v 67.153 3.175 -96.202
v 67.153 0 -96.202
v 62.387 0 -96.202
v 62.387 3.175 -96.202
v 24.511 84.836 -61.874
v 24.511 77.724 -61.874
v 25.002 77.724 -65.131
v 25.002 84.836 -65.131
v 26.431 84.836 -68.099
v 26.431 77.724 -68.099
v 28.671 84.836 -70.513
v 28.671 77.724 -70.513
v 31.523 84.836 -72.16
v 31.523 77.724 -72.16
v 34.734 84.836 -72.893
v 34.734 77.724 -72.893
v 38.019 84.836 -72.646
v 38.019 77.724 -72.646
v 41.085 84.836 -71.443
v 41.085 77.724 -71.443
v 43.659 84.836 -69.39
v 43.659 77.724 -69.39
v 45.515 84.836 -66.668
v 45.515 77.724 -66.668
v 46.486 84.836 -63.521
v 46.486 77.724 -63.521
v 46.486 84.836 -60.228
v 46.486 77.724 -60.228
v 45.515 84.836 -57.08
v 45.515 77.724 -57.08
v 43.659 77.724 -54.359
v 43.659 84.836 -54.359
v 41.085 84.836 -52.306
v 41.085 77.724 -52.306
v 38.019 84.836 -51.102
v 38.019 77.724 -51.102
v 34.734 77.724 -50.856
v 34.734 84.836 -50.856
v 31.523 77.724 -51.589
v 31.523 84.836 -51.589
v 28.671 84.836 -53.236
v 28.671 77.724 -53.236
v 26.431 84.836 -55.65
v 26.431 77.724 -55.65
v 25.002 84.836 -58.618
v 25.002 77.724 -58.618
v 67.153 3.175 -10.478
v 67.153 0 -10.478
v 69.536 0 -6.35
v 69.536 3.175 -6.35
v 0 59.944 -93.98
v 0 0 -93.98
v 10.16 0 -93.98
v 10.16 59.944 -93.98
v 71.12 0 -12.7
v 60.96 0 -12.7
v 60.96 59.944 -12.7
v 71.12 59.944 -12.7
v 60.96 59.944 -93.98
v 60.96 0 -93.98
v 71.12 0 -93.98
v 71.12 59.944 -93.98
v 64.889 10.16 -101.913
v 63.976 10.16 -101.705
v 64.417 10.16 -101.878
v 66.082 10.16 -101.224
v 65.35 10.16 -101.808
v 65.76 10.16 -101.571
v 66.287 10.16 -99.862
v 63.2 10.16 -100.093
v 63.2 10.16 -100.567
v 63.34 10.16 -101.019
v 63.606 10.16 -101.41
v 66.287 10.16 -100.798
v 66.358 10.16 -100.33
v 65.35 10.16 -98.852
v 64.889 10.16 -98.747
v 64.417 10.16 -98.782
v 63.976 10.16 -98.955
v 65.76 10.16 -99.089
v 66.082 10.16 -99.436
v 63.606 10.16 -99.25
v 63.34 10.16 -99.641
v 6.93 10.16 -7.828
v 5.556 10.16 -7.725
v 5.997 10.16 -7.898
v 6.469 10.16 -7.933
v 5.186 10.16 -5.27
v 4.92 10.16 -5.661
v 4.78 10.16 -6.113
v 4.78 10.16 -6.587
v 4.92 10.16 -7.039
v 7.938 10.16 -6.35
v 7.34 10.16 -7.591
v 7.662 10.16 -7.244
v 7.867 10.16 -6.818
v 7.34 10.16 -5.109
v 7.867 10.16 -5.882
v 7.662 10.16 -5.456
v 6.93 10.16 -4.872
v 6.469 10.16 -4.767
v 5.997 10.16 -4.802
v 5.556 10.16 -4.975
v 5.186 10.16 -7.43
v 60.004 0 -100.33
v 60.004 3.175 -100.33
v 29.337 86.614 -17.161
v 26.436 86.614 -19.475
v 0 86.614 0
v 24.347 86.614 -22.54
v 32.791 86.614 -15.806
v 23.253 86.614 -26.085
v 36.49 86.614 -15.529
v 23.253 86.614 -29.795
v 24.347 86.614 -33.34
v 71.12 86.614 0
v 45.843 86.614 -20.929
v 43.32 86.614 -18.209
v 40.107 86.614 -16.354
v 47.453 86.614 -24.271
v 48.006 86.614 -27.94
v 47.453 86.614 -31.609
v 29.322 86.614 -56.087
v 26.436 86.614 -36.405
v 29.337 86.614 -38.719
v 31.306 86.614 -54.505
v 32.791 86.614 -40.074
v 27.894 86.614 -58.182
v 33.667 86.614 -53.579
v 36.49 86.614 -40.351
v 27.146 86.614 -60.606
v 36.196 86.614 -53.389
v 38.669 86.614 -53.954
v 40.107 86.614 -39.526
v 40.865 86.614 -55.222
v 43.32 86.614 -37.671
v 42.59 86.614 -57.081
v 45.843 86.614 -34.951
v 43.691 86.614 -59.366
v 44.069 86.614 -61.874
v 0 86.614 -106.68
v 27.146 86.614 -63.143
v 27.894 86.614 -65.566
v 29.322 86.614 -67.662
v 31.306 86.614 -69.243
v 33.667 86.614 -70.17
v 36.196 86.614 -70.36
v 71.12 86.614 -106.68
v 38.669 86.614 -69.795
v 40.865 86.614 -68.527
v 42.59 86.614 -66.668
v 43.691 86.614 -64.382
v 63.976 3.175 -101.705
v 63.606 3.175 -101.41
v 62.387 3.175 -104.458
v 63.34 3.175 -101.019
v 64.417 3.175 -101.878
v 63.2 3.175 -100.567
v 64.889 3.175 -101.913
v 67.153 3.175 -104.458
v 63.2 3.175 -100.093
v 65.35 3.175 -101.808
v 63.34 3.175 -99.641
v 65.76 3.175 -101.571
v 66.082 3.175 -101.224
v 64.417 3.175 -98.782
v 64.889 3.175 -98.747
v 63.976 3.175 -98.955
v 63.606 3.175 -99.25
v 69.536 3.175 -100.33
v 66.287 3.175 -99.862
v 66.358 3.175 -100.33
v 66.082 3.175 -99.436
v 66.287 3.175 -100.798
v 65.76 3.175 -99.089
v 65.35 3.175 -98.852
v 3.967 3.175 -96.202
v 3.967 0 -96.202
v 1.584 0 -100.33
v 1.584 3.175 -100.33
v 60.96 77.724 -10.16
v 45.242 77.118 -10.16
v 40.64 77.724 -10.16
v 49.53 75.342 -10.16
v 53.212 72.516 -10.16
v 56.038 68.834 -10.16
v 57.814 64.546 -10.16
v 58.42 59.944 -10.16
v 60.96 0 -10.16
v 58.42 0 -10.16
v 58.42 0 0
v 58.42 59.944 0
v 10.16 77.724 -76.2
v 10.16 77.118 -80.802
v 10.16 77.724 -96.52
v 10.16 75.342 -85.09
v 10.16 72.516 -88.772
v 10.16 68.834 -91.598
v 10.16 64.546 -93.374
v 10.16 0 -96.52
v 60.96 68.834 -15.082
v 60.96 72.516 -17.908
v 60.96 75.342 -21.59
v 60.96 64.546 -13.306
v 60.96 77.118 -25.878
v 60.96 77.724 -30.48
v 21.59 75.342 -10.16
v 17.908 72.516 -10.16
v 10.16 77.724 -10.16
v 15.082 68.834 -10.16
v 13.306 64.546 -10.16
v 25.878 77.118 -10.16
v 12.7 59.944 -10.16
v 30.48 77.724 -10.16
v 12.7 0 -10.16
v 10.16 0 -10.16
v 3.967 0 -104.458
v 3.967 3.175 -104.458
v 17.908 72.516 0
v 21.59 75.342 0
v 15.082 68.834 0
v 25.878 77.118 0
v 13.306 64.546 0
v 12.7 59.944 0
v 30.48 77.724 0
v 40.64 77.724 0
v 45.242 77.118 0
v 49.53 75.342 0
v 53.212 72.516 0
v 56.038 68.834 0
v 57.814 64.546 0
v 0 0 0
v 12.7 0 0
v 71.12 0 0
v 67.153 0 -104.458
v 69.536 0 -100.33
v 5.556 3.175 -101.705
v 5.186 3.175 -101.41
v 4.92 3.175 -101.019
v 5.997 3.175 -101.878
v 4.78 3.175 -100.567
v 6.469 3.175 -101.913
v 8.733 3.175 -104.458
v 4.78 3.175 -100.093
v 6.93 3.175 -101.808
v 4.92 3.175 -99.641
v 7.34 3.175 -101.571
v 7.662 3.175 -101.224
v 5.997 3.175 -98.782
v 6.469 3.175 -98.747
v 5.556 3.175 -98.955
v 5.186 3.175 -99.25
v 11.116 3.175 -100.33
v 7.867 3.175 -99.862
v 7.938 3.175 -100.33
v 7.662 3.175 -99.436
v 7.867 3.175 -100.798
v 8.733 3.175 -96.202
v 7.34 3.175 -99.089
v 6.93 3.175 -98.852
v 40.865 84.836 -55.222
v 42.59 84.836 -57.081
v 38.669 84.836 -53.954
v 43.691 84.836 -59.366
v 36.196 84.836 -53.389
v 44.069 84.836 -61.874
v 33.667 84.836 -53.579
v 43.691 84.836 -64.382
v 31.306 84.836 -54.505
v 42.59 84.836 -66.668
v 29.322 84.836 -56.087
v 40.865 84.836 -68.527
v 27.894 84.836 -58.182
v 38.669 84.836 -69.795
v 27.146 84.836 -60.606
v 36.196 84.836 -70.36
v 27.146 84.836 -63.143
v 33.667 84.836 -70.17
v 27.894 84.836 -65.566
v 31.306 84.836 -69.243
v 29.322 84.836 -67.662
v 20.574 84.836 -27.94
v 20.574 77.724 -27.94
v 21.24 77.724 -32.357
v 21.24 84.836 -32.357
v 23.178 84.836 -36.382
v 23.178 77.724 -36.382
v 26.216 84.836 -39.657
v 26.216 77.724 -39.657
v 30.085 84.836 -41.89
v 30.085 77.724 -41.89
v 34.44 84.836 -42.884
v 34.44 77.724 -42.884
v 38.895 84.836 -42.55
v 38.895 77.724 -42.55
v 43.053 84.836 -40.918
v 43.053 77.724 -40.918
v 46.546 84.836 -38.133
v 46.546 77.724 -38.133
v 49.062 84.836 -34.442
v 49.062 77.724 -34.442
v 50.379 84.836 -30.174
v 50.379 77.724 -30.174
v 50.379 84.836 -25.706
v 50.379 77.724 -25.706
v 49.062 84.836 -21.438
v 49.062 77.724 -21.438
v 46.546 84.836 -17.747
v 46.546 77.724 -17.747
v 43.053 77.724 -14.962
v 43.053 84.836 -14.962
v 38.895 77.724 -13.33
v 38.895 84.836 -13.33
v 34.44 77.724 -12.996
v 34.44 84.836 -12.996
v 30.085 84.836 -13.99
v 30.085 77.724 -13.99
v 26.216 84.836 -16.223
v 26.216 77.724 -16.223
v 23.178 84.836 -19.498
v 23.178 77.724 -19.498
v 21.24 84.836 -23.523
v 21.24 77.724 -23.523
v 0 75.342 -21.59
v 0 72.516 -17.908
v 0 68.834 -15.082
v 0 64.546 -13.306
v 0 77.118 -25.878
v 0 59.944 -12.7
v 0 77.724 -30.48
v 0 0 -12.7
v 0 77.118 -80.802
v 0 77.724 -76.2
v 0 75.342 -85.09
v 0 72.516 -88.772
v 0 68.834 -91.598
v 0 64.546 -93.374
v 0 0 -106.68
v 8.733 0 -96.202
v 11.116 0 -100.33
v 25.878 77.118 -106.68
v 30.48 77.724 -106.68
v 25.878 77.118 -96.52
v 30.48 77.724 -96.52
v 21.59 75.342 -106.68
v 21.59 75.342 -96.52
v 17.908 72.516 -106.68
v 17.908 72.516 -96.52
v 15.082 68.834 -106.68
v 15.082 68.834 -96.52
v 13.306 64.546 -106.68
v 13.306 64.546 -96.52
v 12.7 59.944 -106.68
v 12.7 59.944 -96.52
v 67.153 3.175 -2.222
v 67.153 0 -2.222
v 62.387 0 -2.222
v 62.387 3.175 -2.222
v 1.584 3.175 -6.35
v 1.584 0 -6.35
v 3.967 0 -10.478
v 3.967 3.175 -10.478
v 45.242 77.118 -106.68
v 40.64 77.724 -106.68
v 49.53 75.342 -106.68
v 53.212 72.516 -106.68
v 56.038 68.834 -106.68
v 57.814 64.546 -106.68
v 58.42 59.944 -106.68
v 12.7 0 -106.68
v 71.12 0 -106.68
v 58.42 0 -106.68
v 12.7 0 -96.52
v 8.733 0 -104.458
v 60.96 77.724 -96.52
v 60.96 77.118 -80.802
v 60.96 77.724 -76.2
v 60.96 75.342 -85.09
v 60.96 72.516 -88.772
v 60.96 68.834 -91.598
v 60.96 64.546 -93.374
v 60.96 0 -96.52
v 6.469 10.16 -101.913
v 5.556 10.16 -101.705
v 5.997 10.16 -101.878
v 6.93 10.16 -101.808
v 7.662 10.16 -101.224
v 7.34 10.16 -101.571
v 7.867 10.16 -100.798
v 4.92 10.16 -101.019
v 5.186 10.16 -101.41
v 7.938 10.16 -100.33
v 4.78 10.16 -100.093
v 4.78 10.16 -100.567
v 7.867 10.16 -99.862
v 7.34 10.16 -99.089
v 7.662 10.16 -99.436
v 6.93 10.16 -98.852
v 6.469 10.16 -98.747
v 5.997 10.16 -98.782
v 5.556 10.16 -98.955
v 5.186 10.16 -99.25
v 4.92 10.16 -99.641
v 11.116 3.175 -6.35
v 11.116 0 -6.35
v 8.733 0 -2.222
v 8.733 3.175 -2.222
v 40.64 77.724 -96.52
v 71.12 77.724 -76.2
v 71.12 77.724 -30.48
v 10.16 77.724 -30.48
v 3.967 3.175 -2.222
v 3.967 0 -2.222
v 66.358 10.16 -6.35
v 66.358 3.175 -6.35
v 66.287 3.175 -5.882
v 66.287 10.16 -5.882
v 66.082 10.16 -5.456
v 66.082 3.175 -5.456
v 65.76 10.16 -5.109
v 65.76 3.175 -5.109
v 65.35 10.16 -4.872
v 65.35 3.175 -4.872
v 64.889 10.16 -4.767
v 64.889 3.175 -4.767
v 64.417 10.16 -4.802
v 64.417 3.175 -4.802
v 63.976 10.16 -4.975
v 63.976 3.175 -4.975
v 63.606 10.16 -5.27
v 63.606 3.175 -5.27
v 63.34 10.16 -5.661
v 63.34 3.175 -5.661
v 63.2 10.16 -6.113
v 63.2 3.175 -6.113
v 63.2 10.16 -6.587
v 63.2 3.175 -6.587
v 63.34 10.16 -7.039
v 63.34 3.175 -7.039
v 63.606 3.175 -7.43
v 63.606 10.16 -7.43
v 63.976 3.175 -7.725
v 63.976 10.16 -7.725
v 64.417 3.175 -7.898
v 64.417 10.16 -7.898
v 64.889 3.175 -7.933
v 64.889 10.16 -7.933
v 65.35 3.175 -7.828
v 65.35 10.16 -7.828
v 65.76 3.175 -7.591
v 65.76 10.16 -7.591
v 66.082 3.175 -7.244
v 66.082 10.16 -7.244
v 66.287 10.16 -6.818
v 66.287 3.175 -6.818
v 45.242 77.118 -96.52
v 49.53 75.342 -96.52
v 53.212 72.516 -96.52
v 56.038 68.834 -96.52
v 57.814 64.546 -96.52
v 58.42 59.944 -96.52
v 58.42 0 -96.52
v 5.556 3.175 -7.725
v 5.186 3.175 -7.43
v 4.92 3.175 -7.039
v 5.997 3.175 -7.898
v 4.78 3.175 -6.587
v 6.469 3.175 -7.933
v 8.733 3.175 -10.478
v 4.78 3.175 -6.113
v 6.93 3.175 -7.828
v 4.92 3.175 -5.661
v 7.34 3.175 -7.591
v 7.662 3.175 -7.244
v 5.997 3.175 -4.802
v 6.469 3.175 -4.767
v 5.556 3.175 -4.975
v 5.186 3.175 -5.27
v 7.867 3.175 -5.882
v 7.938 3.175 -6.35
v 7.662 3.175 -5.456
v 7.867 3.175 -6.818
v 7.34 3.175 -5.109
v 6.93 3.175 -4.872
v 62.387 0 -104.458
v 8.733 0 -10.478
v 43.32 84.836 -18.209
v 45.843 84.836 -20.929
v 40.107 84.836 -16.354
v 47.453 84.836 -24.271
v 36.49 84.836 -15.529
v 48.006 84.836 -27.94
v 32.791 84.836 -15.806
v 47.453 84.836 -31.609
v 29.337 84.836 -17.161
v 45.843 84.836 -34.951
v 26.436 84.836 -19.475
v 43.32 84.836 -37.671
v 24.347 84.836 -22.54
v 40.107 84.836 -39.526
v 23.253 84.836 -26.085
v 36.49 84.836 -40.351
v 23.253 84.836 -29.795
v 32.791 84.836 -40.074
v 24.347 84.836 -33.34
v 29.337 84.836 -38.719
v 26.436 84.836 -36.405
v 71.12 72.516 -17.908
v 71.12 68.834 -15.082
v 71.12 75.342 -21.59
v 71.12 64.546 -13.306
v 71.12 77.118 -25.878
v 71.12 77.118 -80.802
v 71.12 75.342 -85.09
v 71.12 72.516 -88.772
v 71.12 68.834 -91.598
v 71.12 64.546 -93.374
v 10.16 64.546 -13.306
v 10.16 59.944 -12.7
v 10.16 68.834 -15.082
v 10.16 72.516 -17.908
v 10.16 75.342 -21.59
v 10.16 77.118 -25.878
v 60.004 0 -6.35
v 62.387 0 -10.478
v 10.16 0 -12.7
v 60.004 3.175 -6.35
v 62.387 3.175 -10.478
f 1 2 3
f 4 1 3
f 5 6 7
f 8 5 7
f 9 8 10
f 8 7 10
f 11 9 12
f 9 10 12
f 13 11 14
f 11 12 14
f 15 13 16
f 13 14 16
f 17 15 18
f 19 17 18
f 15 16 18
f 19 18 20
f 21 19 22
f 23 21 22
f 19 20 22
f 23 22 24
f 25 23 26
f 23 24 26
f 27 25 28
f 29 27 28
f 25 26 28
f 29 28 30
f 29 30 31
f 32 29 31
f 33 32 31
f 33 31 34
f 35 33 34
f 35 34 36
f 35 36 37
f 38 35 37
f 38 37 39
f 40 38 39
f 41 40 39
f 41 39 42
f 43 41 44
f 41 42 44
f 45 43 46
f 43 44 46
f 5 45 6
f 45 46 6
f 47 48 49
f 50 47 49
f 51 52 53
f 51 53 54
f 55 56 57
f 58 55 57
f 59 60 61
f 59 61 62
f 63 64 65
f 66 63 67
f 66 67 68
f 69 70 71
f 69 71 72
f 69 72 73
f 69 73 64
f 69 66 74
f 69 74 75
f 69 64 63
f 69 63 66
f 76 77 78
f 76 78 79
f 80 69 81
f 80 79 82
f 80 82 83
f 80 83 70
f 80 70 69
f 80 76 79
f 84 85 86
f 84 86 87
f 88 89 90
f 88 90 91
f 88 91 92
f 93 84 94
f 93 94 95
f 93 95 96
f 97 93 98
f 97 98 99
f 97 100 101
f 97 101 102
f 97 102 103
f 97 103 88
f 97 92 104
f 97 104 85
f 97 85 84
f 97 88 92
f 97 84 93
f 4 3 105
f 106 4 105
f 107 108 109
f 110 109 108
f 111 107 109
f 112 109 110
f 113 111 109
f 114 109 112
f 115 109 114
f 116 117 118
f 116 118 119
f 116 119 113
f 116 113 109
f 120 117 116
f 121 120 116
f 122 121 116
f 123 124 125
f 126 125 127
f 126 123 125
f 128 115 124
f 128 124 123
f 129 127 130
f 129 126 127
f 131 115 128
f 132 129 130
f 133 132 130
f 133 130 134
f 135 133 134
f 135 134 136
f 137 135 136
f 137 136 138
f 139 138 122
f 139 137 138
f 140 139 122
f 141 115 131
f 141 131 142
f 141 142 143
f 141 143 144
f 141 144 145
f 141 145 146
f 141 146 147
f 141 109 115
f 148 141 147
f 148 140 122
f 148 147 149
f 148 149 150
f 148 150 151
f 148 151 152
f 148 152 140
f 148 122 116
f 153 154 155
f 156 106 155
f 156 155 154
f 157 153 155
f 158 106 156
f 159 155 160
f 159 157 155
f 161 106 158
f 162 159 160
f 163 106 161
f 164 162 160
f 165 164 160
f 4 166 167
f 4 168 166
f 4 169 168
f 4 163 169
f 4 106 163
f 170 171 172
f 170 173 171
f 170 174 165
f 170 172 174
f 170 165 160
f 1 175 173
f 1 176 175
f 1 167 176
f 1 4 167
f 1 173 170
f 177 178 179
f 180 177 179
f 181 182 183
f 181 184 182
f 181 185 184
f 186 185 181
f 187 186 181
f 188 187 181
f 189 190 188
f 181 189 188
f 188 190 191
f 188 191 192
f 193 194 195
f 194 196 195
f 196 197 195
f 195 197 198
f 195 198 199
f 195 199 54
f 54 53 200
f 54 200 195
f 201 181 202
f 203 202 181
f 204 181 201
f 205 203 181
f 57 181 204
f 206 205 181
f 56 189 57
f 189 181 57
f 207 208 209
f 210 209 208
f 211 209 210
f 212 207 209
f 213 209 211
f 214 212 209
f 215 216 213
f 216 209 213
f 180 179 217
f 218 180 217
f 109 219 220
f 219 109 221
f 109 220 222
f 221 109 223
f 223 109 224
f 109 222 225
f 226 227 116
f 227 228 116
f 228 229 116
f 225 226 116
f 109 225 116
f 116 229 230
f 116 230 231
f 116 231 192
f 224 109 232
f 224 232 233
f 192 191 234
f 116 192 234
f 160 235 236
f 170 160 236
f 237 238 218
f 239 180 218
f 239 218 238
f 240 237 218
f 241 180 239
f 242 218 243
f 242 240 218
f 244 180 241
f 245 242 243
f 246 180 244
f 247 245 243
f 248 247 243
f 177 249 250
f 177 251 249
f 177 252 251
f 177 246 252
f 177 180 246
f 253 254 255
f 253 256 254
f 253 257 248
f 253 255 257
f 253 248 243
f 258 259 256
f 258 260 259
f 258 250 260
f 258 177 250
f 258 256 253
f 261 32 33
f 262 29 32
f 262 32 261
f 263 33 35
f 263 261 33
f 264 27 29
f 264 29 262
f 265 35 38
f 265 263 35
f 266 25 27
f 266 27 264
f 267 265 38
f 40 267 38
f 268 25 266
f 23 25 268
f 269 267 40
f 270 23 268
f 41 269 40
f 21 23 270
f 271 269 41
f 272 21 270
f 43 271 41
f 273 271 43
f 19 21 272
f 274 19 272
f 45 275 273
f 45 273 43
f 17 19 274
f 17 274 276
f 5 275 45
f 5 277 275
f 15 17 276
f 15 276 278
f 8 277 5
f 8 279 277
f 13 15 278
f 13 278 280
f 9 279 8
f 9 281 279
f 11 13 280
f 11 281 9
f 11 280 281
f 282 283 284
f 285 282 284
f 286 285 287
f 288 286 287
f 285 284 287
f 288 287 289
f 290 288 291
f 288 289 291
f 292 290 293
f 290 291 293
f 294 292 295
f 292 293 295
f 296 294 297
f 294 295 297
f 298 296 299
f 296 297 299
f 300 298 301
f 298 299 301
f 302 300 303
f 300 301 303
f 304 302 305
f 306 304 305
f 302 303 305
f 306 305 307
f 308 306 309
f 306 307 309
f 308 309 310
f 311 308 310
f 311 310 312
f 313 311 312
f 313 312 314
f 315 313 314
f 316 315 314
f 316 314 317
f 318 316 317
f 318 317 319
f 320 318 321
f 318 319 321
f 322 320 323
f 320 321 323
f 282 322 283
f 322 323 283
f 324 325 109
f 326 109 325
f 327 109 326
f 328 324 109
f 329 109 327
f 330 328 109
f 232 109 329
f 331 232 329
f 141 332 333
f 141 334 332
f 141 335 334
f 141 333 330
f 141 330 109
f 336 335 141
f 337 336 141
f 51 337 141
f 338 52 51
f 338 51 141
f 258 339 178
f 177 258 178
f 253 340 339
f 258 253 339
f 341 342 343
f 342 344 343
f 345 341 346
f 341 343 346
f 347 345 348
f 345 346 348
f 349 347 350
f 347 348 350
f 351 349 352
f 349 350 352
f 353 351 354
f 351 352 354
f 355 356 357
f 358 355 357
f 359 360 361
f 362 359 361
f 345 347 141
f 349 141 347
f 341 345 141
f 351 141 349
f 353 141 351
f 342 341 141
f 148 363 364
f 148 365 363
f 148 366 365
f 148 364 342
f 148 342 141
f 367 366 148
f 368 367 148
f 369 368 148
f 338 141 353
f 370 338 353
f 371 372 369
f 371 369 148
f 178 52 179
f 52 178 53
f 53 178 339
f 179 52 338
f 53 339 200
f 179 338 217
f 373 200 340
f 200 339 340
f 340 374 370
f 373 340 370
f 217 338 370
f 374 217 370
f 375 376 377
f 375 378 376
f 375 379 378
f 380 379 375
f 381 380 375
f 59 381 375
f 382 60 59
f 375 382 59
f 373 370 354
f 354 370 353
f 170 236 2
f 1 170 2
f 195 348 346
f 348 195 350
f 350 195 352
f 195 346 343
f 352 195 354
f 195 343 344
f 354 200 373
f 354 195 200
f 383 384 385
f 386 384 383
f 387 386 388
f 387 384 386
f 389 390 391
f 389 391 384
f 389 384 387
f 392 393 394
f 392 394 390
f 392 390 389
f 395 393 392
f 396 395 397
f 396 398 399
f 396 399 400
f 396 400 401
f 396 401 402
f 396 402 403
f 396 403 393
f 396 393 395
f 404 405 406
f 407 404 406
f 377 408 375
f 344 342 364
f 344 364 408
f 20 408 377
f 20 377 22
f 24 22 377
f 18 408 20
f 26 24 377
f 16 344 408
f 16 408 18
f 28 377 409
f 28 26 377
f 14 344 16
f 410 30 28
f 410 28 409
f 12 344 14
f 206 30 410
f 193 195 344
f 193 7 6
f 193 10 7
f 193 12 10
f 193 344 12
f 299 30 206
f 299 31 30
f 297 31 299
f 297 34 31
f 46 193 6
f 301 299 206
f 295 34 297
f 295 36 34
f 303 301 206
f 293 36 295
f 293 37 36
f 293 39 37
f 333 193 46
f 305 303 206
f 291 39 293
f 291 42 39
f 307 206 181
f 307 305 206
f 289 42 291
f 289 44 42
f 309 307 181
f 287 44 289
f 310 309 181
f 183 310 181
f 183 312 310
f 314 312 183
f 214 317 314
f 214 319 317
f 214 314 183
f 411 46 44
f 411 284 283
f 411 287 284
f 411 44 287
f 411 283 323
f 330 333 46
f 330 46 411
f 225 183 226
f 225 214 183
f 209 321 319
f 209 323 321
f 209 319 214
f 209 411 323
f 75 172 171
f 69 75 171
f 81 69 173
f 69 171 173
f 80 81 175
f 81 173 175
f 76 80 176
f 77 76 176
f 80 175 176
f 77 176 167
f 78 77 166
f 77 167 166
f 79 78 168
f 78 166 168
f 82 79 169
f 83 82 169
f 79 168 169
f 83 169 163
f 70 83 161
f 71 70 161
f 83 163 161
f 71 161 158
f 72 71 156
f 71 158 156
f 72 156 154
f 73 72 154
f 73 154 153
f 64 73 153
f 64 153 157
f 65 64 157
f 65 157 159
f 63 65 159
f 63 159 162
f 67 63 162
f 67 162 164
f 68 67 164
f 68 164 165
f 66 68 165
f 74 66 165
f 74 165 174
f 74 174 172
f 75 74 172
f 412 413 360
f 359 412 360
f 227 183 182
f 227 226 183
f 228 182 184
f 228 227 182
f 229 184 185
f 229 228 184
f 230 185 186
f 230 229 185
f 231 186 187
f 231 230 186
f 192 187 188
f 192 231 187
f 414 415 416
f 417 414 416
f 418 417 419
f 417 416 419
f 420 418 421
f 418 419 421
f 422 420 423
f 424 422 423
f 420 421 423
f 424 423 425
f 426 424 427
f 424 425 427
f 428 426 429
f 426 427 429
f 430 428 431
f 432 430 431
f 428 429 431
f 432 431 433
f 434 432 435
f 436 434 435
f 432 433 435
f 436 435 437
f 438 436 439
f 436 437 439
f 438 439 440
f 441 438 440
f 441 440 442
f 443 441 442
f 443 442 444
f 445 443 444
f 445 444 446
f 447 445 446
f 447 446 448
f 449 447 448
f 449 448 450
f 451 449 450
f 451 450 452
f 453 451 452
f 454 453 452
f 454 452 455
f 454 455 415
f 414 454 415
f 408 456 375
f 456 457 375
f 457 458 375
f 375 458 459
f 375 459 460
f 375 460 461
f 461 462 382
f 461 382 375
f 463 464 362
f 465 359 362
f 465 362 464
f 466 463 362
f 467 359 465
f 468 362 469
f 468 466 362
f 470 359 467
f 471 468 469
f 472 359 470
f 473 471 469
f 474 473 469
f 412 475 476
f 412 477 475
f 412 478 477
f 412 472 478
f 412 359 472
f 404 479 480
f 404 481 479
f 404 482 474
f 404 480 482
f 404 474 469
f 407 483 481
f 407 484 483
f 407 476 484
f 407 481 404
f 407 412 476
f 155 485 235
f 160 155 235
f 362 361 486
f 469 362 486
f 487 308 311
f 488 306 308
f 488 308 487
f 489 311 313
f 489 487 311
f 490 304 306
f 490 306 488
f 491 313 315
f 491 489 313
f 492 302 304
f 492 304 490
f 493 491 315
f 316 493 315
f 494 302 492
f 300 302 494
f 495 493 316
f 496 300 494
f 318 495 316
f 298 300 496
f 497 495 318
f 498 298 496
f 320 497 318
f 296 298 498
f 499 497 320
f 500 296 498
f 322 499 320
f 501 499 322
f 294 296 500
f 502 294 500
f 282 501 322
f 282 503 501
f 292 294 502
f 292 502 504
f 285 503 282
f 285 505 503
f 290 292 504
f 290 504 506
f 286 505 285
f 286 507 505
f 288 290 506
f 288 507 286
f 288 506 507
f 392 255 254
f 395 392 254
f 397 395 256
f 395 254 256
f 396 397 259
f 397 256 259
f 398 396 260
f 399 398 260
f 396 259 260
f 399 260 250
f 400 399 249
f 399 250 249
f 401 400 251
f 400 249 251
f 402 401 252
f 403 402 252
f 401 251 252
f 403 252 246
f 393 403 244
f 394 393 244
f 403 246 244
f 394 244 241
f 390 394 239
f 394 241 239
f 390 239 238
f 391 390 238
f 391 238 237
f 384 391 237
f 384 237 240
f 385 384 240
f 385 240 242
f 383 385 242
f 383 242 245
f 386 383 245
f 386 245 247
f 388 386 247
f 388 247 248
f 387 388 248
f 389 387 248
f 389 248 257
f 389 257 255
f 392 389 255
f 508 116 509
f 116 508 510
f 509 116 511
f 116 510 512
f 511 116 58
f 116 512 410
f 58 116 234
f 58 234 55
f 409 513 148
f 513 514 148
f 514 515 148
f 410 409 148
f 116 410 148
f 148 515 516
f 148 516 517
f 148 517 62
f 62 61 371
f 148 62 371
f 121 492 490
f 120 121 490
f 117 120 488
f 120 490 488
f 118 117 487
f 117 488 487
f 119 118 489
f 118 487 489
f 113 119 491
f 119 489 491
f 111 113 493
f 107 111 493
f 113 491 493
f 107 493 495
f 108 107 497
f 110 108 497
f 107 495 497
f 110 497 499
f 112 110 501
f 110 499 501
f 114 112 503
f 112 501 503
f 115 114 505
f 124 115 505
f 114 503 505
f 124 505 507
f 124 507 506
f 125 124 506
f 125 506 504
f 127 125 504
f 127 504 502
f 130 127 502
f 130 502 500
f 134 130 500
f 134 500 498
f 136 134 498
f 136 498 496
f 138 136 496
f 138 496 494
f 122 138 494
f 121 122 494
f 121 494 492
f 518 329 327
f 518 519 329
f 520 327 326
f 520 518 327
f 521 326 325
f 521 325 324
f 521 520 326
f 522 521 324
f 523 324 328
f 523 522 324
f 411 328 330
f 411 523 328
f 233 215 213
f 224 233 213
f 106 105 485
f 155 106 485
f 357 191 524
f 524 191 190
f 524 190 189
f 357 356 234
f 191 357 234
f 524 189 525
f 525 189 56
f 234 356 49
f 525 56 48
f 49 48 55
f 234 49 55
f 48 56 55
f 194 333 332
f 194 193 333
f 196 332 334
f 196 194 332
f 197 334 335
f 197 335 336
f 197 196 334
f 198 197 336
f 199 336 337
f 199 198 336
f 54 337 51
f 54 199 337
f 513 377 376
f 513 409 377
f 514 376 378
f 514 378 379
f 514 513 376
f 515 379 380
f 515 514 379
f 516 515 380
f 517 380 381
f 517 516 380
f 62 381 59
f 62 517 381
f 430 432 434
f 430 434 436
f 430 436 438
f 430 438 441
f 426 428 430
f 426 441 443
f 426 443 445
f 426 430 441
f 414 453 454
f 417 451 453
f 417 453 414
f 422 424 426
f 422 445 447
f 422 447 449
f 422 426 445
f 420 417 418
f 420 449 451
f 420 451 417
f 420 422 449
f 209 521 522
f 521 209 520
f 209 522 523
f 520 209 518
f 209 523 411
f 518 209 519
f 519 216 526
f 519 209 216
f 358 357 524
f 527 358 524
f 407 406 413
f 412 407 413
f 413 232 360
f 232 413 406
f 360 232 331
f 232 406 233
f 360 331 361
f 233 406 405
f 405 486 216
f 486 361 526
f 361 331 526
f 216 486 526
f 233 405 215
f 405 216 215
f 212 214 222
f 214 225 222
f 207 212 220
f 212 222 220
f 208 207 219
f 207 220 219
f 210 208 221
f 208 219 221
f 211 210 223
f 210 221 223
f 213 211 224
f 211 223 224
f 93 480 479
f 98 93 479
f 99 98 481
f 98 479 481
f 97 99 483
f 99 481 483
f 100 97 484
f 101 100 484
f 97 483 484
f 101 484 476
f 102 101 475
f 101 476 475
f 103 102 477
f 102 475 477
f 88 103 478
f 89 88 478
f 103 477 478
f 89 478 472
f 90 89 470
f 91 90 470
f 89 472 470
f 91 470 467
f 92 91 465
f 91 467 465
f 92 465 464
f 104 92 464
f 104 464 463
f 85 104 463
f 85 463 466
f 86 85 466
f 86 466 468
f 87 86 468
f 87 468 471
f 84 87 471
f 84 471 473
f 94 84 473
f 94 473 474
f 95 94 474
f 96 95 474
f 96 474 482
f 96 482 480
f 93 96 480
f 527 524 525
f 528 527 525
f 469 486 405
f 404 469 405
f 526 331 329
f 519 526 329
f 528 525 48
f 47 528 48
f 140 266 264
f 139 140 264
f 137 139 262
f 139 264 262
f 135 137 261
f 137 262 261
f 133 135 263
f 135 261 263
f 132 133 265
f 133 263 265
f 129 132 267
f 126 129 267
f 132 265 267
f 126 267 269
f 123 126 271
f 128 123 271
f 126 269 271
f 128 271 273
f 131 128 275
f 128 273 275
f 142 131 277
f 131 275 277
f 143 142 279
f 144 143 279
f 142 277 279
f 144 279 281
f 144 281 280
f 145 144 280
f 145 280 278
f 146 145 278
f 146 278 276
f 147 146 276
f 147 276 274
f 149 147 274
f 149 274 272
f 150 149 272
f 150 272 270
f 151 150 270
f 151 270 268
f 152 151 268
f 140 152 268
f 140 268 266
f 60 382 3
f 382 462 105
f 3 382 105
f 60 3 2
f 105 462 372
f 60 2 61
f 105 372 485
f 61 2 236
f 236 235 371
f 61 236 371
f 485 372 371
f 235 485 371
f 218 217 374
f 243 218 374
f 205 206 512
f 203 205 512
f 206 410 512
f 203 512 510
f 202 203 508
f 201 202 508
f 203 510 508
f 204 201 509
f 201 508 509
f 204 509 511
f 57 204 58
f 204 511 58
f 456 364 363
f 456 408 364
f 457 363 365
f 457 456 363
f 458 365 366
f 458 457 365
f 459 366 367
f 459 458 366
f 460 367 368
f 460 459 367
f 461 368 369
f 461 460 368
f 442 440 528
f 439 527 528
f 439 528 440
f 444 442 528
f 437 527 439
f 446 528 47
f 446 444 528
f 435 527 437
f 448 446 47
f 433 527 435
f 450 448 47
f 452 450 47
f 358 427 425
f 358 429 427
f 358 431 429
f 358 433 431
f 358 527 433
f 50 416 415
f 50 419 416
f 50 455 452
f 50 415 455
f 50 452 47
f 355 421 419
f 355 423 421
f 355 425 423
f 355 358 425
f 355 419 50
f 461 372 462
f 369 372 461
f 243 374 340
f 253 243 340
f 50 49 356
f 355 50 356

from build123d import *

# Parameters (mm, degrees)
SKETCH1_W               = 71.12
SKETCH1_H               = 106.68
BOSS_EXTRUDE1_DEPTH     = 87.884
SHELL1_T                = -10.16
SKETCH3_R               = 1.5875
CUT_EXTRUDE1_DEPTH      = 10.16
SKETCH4_W               = 81.28
SKETCH4_H               = 77.724
CUT_EXTRUDE2_DEPTH      = 72.12
CUT_EXTRUDE3_DEPTH      = 3.175
SKETCH7_W               = 45.72
SKETCH7_H               = 77.724
CUT_EXTRUDE4_DEPTH      = 1
CUT_EXTRUDE4_DEPTH_BACK = 107.68
SKETCH9_W               = 71.12
SKETCH9_H               = 106.68
CUT_EXTRUDE6_DEPTH      = 1.27
SKETCH10_R              = 14.986
SKETCH10_R_2            = 11.049
CUT_EXTRUDE7_DEPTH      = 7.112
SKETCH11_R              = 12.446
SKETCH11_R_2            = 8.509
CUT_EXTRUDE9_DEPTH      = 9.89
FILLET1_R               = 17.78


with BuildPart() as part:
    # Sketch1 → Boss-Extrude1 (new body)
    with BuildSketch(Plane(origin=(0, 0, 0), x_dir=(1, 0, 0), z_dir=(0, 1, 0))):
        with Locations((35.56, 53.34)):
            Rectangle(SKETCH1_W, SKETCH1_H)
    extrude(amount=BOSS_EXTRUDE1_DEPTH)

    # Shell1
    shell1_openings = [part.faces().sort_by_distance(p)[0] for p in [
        (35.56, 0, -53.34),
    ]]
    offset(amount=SHELL1_T, openings=shell1_openings, kind=Kind.INTERSECTION)

    # Sketch3 → Cut-Extrude1 (cut)
    with BuildSketch(Plane.XZ):
        with Locations((6.35, -6.35)):
            Circle(SKETCH3_R)
        with Locations((64.77, -6.35)):
            Circle(SKETCH3_R)
        with Locations((64.77, -100.33)):
            Circle(SKETCH3_R)
        with Locations((6.35, -100.33)):
            Circle(SKETCH3_R)
    extrude(amount=-CUT_EXTRUDE1_DEPTH, mode=Mode.SUBTRACT)

    # Sketch4 → Cut-Extrude2 (cut, through all)
    with BuildSketch(Plane.ZY):
        with Locations((-53.34, 38.862)):
            Rectangle(SKETCH4_W, SKETCH4_H)
    extrude(amount=-CUT_EXTRUDE2_DEPTH, mode=Mode.SUBTRACT)

    # Sketch6 → Cut-Extrude3 (cut)
    with BuildSketch(Plane.XZ):
        Polygon((69.536026472, -6.35), (67.153013236, -2.2225), (62.386986764, -2.2225), (60.003973528, -6.35), (62.386986764, -10.4775), (67.153013236, -10.4775), align=None)
        Polygon((11.116026472, -6.35), (8.733013236, -2.2225), (3.966986764, -2.2225), (1.583973528, -6.35), (3.966986764, -10.4775), (8.733013236, -10.4775), align=None)
        Polygon((69.536026472, -100.33), (67.153013236, -96.2025), (62.386986764, -96.2025), (60.003973528, -100.33), (62.386986764, -104.4575), (67.153013236, -104.4575), align=None)
        Polygon((11.116026472, -100.33), (8.733013236, -96.2025), (3.966986764, -96.2025), (1.583973528, -100.33), (3.966986764, -104.4575), (8.733013236, -104.4575), align=None)
    extrude(amount=-CUT_EXTRUDE3_DEPTH, mode=Mode.SUBTRACT)

    # Sketch7 → Cut-Extrude4 (cut, two sides)
    with BuildSketch(Plane(origin=(0, 0, -106.68), x_dir=(-1, 0, 0), z_dir=(0, 0, -1))) as cut_extrude4_sk:
        with Locations((-35.56, 38.862)):
            Rectangle(SKETCH7_W, SKETCH7_H)
    extrude(amount=CUT_EXTRUDE4_DEPTH, mode=Mode.SUBTRACT)
    extrude(cut_extrude4_sk.sketch, amount=-CUT_EXTRUDE4_DEPTH_BACK, mode=Mode.SUBTRACT)

    # Sketch9 → Cut-Extrude6 (cut)
    with BuildSketch(Plane(origin=(0, 87.884, 0), x_dir=(1, 0, 0), z_dir=(0, 1, 0))):
        with Locations((35.56, 53.34)):
            Rectangle(SKETCH9_W, SKETCH9_H)
    extrude(amount=-CUT_EXTRUDE6_DEPTH, mode=Mode.SUBTRACT)

    # Sketch10 → Cut-Extrude7 (cut)
    with BuildSketch(Plane(origin=(0, 77.724, 0), x_dir=(-1, 0, 0), z_dir=(0, -1, 0))):
        with Locations((-35.56, 27.94)):
            Circle(SKETCH10_R)
        with Locations((-35.56, 61.8744)):
            Circle(SKETCH10_R_2)
    extrude(amount=-CUT_EXTRUDE7_DEPTH, mode=Mode.SUBTRACT)

    # Sketch11 → Cut-Extrude9 (cut, through all)
    with BuildSketch(Plane.XZ.offset(-77.724)):
        with Locations((35.56, -27.94)):
            Circle(SKETCH11_R)
        with Locations((35.56, -61.8744)):
            Circle(SKETCH11_R_2)
    extrude(amount=-CUT_EXTRUDE9_DEPTH, mode=Mode.SUBTRACT)

    # Fillet1
    fillet1_edges = [part.edges().sort_by_distance(p)[0] for p in [
        (58.42, 77.724, -101.6),
        (58.42, 77.724, -5.08),
        (12.7, 77.724, -101.6),
        (12.7, 77.724, -5.08),
        (5.08, 77.724, -93.98),
        (5.08, 77.724, -12.7),
        (66.04, 77.724, -93.98),
        (66.04, 77.724, -12.7),
    ]]
    fillet(fillet1_edges, radius=FILLET1_R)


solid = part.part
